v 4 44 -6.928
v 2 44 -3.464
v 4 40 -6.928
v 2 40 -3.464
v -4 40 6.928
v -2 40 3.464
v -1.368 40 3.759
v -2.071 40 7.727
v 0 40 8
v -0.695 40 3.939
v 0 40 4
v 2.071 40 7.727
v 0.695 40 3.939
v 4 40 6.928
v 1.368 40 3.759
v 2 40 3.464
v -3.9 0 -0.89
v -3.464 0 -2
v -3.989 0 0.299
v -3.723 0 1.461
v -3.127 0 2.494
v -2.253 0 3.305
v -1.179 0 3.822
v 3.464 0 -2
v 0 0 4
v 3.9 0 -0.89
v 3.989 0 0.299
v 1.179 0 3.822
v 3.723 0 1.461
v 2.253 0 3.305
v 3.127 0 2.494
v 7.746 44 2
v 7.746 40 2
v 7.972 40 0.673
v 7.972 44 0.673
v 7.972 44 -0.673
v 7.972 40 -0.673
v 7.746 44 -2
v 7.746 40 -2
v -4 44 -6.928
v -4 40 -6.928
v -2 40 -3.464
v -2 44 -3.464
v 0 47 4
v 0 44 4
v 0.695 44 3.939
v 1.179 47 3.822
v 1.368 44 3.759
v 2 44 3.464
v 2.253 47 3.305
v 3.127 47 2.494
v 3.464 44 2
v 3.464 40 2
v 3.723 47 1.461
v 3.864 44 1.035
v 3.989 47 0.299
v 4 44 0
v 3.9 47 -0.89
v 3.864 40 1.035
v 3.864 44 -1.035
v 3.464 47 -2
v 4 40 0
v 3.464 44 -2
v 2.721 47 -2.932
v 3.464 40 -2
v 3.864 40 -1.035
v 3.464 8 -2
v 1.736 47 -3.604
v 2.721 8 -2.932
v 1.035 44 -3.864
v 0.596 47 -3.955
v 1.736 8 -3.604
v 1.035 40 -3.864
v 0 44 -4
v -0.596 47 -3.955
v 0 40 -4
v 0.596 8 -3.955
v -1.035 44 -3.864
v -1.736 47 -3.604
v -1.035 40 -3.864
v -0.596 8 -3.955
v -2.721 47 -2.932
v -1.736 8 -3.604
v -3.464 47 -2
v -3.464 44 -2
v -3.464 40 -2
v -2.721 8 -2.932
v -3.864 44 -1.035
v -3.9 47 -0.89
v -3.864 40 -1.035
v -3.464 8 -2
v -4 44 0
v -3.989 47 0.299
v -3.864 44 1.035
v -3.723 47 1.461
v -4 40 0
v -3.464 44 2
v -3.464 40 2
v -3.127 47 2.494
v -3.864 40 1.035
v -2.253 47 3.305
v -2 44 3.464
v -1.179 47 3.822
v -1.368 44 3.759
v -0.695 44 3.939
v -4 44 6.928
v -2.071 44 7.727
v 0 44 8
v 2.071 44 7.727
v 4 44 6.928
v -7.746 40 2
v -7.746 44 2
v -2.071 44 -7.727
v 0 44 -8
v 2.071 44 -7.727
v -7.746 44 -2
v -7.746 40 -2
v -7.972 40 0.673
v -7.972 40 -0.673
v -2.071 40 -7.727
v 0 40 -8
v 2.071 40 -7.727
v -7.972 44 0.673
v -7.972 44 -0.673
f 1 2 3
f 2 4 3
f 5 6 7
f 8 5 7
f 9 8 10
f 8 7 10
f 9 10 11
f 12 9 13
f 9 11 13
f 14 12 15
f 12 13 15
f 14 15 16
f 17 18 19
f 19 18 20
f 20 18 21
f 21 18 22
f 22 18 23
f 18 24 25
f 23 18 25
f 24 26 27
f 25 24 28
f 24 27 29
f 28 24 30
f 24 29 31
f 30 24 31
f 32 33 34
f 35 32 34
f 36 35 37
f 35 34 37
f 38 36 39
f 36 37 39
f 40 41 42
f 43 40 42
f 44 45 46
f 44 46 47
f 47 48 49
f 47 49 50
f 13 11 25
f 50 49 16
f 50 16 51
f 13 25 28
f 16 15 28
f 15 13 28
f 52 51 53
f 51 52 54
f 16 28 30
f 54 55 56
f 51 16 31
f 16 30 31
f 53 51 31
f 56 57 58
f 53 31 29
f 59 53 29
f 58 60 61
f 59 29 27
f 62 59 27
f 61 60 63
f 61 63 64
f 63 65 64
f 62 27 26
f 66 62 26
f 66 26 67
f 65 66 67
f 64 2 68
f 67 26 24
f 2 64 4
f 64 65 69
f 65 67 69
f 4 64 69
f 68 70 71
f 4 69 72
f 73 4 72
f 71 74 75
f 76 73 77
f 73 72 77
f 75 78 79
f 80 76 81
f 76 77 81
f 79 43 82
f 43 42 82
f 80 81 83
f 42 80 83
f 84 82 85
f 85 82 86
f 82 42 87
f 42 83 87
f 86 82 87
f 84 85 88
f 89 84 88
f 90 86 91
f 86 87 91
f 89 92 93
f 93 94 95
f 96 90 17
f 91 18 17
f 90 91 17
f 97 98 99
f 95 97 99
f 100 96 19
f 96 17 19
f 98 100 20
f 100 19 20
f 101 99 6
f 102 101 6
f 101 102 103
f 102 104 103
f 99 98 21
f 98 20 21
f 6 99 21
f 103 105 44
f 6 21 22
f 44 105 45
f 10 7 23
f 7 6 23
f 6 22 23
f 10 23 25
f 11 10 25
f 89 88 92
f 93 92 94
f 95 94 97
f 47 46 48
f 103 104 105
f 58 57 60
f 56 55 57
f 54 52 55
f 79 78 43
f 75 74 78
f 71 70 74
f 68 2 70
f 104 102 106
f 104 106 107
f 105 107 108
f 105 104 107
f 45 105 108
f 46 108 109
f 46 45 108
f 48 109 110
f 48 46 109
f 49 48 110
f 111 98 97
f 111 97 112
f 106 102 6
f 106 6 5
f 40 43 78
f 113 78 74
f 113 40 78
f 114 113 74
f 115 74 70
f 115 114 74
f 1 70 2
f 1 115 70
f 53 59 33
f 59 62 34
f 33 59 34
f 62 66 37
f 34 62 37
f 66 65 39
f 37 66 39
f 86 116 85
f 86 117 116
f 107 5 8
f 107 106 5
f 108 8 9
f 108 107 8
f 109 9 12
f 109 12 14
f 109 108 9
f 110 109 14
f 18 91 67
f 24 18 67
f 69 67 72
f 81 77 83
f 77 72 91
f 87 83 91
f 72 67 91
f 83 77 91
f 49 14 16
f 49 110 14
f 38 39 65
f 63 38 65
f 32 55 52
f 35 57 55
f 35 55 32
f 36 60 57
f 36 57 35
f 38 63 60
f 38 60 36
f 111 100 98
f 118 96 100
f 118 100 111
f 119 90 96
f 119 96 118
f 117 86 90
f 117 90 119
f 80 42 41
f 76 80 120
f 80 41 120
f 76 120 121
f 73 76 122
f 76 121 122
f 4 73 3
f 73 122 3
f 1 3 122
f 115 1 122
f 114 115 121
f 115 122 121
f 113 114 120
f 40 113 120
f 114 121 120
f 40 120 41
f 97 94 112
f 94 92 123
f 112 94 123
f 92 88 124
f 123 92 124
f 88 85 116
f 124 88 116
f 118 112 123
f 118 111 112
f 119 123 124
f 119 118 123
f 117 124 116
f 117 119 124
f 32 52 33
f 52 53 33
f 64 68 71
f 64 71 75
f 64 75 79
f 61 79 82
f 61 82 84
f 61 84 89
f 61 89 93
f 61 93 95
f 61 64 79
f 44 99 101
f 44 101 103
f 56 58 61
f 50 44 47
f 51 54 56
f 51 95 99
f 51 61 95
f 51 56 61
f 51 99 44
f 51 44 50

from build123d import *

# Parameters (mm, degrees)
SKETCH1_R           = 4
BOSS_EXTRUDE1_DEPTH = 47
BOSS_EXTRUDE2_DEPTH = 2
CUT_EXTRUDE1_DEPTH  = 8


with BuildPart() as part:
    # Sketch1 → Boss-Extrude1 (new body)
    with BuildSketch(Plane(origin=(0, 0, 0), x_dir=(1, 0, 0), z_dir=(0, 1, 0))):
        with Locations(Location((0, 0, 0), (0, 0, 270))):
            Circle(SKETCH1_R)
    extrude(amount=BOSS_EXTRUDE1_DEPTH)

    # Sketch2 → Boss-Extrude2 (add, symmetric)
    with BuildSketch(Plane(origin=(0, 42, 0), x_dir=(1, 0, 0), z_dir=(0, 1, 0))):
        with BuildLine():
            Line((-4, 6.92820323), (-2, 3.464101615))
            ThreePointArc((-2, 3.464101615), (0, 4), (2, 3.464101615))
            Line((2, 3.464101615), (4, 6.92820323))
            ThreePointArc((4, 6.92820323), (0, 8), (-4, 6.92820323))
        make_face()
        with BuildLine():
            Line((-7.745966692, 2), (-3.464101615, 2))
            ThreePointArc((-3.464101615, 2), (-4, 0), (-3.464101615, -2))
            Line((-3.464101615, -2), (-7.745966692, -2))
            ThreePointArc((-7.745966692, -2), (-8, 0), (-7.745966692, 2))
        make_face()
        with BuildLine():
            Line((7.745966692, 2), (3.464101615, 2))
            ThreePointArc((3.464101615, 2), (4, 0), (3.464101615, -2))
            Line((3.464101615, -2), (7.745966692, -2))
            ThreePointArc((7.745966692, -2), (8, 0), (7.745966692, 2))
        make_face()
        with BuildLine():
            Line((4, -6.92820323), (2, -3.464101615))
            ThreePointArc((2, -3.464101615), (0, -4), (-2, -3.464101615))
            Line((-2, -3.464101615), (-4, -6.92820323))
            ThreePointArc((-4, -6.92820323), (0, -8), (4, -6.92820323))
        make_face()
    extrude(amount=BOSS_EXTRUDE2_DEPTH, both=True)

    # Sketch3 → Cut-Extrude1 (cut)
    with BuildSketch(Plane.XZ):
        with BuildLine():
            Line((-3.464101615, -2), (3.464101615, -2))
            ThreePointArc((3.464101615, -2), (0, -4), (-3.464101615, -2))
        make_face()
    extrude(amount=-CUT_EXTRUDE1_DEPTH, mode=Mode.SUBTRACT)


solid = part.part
